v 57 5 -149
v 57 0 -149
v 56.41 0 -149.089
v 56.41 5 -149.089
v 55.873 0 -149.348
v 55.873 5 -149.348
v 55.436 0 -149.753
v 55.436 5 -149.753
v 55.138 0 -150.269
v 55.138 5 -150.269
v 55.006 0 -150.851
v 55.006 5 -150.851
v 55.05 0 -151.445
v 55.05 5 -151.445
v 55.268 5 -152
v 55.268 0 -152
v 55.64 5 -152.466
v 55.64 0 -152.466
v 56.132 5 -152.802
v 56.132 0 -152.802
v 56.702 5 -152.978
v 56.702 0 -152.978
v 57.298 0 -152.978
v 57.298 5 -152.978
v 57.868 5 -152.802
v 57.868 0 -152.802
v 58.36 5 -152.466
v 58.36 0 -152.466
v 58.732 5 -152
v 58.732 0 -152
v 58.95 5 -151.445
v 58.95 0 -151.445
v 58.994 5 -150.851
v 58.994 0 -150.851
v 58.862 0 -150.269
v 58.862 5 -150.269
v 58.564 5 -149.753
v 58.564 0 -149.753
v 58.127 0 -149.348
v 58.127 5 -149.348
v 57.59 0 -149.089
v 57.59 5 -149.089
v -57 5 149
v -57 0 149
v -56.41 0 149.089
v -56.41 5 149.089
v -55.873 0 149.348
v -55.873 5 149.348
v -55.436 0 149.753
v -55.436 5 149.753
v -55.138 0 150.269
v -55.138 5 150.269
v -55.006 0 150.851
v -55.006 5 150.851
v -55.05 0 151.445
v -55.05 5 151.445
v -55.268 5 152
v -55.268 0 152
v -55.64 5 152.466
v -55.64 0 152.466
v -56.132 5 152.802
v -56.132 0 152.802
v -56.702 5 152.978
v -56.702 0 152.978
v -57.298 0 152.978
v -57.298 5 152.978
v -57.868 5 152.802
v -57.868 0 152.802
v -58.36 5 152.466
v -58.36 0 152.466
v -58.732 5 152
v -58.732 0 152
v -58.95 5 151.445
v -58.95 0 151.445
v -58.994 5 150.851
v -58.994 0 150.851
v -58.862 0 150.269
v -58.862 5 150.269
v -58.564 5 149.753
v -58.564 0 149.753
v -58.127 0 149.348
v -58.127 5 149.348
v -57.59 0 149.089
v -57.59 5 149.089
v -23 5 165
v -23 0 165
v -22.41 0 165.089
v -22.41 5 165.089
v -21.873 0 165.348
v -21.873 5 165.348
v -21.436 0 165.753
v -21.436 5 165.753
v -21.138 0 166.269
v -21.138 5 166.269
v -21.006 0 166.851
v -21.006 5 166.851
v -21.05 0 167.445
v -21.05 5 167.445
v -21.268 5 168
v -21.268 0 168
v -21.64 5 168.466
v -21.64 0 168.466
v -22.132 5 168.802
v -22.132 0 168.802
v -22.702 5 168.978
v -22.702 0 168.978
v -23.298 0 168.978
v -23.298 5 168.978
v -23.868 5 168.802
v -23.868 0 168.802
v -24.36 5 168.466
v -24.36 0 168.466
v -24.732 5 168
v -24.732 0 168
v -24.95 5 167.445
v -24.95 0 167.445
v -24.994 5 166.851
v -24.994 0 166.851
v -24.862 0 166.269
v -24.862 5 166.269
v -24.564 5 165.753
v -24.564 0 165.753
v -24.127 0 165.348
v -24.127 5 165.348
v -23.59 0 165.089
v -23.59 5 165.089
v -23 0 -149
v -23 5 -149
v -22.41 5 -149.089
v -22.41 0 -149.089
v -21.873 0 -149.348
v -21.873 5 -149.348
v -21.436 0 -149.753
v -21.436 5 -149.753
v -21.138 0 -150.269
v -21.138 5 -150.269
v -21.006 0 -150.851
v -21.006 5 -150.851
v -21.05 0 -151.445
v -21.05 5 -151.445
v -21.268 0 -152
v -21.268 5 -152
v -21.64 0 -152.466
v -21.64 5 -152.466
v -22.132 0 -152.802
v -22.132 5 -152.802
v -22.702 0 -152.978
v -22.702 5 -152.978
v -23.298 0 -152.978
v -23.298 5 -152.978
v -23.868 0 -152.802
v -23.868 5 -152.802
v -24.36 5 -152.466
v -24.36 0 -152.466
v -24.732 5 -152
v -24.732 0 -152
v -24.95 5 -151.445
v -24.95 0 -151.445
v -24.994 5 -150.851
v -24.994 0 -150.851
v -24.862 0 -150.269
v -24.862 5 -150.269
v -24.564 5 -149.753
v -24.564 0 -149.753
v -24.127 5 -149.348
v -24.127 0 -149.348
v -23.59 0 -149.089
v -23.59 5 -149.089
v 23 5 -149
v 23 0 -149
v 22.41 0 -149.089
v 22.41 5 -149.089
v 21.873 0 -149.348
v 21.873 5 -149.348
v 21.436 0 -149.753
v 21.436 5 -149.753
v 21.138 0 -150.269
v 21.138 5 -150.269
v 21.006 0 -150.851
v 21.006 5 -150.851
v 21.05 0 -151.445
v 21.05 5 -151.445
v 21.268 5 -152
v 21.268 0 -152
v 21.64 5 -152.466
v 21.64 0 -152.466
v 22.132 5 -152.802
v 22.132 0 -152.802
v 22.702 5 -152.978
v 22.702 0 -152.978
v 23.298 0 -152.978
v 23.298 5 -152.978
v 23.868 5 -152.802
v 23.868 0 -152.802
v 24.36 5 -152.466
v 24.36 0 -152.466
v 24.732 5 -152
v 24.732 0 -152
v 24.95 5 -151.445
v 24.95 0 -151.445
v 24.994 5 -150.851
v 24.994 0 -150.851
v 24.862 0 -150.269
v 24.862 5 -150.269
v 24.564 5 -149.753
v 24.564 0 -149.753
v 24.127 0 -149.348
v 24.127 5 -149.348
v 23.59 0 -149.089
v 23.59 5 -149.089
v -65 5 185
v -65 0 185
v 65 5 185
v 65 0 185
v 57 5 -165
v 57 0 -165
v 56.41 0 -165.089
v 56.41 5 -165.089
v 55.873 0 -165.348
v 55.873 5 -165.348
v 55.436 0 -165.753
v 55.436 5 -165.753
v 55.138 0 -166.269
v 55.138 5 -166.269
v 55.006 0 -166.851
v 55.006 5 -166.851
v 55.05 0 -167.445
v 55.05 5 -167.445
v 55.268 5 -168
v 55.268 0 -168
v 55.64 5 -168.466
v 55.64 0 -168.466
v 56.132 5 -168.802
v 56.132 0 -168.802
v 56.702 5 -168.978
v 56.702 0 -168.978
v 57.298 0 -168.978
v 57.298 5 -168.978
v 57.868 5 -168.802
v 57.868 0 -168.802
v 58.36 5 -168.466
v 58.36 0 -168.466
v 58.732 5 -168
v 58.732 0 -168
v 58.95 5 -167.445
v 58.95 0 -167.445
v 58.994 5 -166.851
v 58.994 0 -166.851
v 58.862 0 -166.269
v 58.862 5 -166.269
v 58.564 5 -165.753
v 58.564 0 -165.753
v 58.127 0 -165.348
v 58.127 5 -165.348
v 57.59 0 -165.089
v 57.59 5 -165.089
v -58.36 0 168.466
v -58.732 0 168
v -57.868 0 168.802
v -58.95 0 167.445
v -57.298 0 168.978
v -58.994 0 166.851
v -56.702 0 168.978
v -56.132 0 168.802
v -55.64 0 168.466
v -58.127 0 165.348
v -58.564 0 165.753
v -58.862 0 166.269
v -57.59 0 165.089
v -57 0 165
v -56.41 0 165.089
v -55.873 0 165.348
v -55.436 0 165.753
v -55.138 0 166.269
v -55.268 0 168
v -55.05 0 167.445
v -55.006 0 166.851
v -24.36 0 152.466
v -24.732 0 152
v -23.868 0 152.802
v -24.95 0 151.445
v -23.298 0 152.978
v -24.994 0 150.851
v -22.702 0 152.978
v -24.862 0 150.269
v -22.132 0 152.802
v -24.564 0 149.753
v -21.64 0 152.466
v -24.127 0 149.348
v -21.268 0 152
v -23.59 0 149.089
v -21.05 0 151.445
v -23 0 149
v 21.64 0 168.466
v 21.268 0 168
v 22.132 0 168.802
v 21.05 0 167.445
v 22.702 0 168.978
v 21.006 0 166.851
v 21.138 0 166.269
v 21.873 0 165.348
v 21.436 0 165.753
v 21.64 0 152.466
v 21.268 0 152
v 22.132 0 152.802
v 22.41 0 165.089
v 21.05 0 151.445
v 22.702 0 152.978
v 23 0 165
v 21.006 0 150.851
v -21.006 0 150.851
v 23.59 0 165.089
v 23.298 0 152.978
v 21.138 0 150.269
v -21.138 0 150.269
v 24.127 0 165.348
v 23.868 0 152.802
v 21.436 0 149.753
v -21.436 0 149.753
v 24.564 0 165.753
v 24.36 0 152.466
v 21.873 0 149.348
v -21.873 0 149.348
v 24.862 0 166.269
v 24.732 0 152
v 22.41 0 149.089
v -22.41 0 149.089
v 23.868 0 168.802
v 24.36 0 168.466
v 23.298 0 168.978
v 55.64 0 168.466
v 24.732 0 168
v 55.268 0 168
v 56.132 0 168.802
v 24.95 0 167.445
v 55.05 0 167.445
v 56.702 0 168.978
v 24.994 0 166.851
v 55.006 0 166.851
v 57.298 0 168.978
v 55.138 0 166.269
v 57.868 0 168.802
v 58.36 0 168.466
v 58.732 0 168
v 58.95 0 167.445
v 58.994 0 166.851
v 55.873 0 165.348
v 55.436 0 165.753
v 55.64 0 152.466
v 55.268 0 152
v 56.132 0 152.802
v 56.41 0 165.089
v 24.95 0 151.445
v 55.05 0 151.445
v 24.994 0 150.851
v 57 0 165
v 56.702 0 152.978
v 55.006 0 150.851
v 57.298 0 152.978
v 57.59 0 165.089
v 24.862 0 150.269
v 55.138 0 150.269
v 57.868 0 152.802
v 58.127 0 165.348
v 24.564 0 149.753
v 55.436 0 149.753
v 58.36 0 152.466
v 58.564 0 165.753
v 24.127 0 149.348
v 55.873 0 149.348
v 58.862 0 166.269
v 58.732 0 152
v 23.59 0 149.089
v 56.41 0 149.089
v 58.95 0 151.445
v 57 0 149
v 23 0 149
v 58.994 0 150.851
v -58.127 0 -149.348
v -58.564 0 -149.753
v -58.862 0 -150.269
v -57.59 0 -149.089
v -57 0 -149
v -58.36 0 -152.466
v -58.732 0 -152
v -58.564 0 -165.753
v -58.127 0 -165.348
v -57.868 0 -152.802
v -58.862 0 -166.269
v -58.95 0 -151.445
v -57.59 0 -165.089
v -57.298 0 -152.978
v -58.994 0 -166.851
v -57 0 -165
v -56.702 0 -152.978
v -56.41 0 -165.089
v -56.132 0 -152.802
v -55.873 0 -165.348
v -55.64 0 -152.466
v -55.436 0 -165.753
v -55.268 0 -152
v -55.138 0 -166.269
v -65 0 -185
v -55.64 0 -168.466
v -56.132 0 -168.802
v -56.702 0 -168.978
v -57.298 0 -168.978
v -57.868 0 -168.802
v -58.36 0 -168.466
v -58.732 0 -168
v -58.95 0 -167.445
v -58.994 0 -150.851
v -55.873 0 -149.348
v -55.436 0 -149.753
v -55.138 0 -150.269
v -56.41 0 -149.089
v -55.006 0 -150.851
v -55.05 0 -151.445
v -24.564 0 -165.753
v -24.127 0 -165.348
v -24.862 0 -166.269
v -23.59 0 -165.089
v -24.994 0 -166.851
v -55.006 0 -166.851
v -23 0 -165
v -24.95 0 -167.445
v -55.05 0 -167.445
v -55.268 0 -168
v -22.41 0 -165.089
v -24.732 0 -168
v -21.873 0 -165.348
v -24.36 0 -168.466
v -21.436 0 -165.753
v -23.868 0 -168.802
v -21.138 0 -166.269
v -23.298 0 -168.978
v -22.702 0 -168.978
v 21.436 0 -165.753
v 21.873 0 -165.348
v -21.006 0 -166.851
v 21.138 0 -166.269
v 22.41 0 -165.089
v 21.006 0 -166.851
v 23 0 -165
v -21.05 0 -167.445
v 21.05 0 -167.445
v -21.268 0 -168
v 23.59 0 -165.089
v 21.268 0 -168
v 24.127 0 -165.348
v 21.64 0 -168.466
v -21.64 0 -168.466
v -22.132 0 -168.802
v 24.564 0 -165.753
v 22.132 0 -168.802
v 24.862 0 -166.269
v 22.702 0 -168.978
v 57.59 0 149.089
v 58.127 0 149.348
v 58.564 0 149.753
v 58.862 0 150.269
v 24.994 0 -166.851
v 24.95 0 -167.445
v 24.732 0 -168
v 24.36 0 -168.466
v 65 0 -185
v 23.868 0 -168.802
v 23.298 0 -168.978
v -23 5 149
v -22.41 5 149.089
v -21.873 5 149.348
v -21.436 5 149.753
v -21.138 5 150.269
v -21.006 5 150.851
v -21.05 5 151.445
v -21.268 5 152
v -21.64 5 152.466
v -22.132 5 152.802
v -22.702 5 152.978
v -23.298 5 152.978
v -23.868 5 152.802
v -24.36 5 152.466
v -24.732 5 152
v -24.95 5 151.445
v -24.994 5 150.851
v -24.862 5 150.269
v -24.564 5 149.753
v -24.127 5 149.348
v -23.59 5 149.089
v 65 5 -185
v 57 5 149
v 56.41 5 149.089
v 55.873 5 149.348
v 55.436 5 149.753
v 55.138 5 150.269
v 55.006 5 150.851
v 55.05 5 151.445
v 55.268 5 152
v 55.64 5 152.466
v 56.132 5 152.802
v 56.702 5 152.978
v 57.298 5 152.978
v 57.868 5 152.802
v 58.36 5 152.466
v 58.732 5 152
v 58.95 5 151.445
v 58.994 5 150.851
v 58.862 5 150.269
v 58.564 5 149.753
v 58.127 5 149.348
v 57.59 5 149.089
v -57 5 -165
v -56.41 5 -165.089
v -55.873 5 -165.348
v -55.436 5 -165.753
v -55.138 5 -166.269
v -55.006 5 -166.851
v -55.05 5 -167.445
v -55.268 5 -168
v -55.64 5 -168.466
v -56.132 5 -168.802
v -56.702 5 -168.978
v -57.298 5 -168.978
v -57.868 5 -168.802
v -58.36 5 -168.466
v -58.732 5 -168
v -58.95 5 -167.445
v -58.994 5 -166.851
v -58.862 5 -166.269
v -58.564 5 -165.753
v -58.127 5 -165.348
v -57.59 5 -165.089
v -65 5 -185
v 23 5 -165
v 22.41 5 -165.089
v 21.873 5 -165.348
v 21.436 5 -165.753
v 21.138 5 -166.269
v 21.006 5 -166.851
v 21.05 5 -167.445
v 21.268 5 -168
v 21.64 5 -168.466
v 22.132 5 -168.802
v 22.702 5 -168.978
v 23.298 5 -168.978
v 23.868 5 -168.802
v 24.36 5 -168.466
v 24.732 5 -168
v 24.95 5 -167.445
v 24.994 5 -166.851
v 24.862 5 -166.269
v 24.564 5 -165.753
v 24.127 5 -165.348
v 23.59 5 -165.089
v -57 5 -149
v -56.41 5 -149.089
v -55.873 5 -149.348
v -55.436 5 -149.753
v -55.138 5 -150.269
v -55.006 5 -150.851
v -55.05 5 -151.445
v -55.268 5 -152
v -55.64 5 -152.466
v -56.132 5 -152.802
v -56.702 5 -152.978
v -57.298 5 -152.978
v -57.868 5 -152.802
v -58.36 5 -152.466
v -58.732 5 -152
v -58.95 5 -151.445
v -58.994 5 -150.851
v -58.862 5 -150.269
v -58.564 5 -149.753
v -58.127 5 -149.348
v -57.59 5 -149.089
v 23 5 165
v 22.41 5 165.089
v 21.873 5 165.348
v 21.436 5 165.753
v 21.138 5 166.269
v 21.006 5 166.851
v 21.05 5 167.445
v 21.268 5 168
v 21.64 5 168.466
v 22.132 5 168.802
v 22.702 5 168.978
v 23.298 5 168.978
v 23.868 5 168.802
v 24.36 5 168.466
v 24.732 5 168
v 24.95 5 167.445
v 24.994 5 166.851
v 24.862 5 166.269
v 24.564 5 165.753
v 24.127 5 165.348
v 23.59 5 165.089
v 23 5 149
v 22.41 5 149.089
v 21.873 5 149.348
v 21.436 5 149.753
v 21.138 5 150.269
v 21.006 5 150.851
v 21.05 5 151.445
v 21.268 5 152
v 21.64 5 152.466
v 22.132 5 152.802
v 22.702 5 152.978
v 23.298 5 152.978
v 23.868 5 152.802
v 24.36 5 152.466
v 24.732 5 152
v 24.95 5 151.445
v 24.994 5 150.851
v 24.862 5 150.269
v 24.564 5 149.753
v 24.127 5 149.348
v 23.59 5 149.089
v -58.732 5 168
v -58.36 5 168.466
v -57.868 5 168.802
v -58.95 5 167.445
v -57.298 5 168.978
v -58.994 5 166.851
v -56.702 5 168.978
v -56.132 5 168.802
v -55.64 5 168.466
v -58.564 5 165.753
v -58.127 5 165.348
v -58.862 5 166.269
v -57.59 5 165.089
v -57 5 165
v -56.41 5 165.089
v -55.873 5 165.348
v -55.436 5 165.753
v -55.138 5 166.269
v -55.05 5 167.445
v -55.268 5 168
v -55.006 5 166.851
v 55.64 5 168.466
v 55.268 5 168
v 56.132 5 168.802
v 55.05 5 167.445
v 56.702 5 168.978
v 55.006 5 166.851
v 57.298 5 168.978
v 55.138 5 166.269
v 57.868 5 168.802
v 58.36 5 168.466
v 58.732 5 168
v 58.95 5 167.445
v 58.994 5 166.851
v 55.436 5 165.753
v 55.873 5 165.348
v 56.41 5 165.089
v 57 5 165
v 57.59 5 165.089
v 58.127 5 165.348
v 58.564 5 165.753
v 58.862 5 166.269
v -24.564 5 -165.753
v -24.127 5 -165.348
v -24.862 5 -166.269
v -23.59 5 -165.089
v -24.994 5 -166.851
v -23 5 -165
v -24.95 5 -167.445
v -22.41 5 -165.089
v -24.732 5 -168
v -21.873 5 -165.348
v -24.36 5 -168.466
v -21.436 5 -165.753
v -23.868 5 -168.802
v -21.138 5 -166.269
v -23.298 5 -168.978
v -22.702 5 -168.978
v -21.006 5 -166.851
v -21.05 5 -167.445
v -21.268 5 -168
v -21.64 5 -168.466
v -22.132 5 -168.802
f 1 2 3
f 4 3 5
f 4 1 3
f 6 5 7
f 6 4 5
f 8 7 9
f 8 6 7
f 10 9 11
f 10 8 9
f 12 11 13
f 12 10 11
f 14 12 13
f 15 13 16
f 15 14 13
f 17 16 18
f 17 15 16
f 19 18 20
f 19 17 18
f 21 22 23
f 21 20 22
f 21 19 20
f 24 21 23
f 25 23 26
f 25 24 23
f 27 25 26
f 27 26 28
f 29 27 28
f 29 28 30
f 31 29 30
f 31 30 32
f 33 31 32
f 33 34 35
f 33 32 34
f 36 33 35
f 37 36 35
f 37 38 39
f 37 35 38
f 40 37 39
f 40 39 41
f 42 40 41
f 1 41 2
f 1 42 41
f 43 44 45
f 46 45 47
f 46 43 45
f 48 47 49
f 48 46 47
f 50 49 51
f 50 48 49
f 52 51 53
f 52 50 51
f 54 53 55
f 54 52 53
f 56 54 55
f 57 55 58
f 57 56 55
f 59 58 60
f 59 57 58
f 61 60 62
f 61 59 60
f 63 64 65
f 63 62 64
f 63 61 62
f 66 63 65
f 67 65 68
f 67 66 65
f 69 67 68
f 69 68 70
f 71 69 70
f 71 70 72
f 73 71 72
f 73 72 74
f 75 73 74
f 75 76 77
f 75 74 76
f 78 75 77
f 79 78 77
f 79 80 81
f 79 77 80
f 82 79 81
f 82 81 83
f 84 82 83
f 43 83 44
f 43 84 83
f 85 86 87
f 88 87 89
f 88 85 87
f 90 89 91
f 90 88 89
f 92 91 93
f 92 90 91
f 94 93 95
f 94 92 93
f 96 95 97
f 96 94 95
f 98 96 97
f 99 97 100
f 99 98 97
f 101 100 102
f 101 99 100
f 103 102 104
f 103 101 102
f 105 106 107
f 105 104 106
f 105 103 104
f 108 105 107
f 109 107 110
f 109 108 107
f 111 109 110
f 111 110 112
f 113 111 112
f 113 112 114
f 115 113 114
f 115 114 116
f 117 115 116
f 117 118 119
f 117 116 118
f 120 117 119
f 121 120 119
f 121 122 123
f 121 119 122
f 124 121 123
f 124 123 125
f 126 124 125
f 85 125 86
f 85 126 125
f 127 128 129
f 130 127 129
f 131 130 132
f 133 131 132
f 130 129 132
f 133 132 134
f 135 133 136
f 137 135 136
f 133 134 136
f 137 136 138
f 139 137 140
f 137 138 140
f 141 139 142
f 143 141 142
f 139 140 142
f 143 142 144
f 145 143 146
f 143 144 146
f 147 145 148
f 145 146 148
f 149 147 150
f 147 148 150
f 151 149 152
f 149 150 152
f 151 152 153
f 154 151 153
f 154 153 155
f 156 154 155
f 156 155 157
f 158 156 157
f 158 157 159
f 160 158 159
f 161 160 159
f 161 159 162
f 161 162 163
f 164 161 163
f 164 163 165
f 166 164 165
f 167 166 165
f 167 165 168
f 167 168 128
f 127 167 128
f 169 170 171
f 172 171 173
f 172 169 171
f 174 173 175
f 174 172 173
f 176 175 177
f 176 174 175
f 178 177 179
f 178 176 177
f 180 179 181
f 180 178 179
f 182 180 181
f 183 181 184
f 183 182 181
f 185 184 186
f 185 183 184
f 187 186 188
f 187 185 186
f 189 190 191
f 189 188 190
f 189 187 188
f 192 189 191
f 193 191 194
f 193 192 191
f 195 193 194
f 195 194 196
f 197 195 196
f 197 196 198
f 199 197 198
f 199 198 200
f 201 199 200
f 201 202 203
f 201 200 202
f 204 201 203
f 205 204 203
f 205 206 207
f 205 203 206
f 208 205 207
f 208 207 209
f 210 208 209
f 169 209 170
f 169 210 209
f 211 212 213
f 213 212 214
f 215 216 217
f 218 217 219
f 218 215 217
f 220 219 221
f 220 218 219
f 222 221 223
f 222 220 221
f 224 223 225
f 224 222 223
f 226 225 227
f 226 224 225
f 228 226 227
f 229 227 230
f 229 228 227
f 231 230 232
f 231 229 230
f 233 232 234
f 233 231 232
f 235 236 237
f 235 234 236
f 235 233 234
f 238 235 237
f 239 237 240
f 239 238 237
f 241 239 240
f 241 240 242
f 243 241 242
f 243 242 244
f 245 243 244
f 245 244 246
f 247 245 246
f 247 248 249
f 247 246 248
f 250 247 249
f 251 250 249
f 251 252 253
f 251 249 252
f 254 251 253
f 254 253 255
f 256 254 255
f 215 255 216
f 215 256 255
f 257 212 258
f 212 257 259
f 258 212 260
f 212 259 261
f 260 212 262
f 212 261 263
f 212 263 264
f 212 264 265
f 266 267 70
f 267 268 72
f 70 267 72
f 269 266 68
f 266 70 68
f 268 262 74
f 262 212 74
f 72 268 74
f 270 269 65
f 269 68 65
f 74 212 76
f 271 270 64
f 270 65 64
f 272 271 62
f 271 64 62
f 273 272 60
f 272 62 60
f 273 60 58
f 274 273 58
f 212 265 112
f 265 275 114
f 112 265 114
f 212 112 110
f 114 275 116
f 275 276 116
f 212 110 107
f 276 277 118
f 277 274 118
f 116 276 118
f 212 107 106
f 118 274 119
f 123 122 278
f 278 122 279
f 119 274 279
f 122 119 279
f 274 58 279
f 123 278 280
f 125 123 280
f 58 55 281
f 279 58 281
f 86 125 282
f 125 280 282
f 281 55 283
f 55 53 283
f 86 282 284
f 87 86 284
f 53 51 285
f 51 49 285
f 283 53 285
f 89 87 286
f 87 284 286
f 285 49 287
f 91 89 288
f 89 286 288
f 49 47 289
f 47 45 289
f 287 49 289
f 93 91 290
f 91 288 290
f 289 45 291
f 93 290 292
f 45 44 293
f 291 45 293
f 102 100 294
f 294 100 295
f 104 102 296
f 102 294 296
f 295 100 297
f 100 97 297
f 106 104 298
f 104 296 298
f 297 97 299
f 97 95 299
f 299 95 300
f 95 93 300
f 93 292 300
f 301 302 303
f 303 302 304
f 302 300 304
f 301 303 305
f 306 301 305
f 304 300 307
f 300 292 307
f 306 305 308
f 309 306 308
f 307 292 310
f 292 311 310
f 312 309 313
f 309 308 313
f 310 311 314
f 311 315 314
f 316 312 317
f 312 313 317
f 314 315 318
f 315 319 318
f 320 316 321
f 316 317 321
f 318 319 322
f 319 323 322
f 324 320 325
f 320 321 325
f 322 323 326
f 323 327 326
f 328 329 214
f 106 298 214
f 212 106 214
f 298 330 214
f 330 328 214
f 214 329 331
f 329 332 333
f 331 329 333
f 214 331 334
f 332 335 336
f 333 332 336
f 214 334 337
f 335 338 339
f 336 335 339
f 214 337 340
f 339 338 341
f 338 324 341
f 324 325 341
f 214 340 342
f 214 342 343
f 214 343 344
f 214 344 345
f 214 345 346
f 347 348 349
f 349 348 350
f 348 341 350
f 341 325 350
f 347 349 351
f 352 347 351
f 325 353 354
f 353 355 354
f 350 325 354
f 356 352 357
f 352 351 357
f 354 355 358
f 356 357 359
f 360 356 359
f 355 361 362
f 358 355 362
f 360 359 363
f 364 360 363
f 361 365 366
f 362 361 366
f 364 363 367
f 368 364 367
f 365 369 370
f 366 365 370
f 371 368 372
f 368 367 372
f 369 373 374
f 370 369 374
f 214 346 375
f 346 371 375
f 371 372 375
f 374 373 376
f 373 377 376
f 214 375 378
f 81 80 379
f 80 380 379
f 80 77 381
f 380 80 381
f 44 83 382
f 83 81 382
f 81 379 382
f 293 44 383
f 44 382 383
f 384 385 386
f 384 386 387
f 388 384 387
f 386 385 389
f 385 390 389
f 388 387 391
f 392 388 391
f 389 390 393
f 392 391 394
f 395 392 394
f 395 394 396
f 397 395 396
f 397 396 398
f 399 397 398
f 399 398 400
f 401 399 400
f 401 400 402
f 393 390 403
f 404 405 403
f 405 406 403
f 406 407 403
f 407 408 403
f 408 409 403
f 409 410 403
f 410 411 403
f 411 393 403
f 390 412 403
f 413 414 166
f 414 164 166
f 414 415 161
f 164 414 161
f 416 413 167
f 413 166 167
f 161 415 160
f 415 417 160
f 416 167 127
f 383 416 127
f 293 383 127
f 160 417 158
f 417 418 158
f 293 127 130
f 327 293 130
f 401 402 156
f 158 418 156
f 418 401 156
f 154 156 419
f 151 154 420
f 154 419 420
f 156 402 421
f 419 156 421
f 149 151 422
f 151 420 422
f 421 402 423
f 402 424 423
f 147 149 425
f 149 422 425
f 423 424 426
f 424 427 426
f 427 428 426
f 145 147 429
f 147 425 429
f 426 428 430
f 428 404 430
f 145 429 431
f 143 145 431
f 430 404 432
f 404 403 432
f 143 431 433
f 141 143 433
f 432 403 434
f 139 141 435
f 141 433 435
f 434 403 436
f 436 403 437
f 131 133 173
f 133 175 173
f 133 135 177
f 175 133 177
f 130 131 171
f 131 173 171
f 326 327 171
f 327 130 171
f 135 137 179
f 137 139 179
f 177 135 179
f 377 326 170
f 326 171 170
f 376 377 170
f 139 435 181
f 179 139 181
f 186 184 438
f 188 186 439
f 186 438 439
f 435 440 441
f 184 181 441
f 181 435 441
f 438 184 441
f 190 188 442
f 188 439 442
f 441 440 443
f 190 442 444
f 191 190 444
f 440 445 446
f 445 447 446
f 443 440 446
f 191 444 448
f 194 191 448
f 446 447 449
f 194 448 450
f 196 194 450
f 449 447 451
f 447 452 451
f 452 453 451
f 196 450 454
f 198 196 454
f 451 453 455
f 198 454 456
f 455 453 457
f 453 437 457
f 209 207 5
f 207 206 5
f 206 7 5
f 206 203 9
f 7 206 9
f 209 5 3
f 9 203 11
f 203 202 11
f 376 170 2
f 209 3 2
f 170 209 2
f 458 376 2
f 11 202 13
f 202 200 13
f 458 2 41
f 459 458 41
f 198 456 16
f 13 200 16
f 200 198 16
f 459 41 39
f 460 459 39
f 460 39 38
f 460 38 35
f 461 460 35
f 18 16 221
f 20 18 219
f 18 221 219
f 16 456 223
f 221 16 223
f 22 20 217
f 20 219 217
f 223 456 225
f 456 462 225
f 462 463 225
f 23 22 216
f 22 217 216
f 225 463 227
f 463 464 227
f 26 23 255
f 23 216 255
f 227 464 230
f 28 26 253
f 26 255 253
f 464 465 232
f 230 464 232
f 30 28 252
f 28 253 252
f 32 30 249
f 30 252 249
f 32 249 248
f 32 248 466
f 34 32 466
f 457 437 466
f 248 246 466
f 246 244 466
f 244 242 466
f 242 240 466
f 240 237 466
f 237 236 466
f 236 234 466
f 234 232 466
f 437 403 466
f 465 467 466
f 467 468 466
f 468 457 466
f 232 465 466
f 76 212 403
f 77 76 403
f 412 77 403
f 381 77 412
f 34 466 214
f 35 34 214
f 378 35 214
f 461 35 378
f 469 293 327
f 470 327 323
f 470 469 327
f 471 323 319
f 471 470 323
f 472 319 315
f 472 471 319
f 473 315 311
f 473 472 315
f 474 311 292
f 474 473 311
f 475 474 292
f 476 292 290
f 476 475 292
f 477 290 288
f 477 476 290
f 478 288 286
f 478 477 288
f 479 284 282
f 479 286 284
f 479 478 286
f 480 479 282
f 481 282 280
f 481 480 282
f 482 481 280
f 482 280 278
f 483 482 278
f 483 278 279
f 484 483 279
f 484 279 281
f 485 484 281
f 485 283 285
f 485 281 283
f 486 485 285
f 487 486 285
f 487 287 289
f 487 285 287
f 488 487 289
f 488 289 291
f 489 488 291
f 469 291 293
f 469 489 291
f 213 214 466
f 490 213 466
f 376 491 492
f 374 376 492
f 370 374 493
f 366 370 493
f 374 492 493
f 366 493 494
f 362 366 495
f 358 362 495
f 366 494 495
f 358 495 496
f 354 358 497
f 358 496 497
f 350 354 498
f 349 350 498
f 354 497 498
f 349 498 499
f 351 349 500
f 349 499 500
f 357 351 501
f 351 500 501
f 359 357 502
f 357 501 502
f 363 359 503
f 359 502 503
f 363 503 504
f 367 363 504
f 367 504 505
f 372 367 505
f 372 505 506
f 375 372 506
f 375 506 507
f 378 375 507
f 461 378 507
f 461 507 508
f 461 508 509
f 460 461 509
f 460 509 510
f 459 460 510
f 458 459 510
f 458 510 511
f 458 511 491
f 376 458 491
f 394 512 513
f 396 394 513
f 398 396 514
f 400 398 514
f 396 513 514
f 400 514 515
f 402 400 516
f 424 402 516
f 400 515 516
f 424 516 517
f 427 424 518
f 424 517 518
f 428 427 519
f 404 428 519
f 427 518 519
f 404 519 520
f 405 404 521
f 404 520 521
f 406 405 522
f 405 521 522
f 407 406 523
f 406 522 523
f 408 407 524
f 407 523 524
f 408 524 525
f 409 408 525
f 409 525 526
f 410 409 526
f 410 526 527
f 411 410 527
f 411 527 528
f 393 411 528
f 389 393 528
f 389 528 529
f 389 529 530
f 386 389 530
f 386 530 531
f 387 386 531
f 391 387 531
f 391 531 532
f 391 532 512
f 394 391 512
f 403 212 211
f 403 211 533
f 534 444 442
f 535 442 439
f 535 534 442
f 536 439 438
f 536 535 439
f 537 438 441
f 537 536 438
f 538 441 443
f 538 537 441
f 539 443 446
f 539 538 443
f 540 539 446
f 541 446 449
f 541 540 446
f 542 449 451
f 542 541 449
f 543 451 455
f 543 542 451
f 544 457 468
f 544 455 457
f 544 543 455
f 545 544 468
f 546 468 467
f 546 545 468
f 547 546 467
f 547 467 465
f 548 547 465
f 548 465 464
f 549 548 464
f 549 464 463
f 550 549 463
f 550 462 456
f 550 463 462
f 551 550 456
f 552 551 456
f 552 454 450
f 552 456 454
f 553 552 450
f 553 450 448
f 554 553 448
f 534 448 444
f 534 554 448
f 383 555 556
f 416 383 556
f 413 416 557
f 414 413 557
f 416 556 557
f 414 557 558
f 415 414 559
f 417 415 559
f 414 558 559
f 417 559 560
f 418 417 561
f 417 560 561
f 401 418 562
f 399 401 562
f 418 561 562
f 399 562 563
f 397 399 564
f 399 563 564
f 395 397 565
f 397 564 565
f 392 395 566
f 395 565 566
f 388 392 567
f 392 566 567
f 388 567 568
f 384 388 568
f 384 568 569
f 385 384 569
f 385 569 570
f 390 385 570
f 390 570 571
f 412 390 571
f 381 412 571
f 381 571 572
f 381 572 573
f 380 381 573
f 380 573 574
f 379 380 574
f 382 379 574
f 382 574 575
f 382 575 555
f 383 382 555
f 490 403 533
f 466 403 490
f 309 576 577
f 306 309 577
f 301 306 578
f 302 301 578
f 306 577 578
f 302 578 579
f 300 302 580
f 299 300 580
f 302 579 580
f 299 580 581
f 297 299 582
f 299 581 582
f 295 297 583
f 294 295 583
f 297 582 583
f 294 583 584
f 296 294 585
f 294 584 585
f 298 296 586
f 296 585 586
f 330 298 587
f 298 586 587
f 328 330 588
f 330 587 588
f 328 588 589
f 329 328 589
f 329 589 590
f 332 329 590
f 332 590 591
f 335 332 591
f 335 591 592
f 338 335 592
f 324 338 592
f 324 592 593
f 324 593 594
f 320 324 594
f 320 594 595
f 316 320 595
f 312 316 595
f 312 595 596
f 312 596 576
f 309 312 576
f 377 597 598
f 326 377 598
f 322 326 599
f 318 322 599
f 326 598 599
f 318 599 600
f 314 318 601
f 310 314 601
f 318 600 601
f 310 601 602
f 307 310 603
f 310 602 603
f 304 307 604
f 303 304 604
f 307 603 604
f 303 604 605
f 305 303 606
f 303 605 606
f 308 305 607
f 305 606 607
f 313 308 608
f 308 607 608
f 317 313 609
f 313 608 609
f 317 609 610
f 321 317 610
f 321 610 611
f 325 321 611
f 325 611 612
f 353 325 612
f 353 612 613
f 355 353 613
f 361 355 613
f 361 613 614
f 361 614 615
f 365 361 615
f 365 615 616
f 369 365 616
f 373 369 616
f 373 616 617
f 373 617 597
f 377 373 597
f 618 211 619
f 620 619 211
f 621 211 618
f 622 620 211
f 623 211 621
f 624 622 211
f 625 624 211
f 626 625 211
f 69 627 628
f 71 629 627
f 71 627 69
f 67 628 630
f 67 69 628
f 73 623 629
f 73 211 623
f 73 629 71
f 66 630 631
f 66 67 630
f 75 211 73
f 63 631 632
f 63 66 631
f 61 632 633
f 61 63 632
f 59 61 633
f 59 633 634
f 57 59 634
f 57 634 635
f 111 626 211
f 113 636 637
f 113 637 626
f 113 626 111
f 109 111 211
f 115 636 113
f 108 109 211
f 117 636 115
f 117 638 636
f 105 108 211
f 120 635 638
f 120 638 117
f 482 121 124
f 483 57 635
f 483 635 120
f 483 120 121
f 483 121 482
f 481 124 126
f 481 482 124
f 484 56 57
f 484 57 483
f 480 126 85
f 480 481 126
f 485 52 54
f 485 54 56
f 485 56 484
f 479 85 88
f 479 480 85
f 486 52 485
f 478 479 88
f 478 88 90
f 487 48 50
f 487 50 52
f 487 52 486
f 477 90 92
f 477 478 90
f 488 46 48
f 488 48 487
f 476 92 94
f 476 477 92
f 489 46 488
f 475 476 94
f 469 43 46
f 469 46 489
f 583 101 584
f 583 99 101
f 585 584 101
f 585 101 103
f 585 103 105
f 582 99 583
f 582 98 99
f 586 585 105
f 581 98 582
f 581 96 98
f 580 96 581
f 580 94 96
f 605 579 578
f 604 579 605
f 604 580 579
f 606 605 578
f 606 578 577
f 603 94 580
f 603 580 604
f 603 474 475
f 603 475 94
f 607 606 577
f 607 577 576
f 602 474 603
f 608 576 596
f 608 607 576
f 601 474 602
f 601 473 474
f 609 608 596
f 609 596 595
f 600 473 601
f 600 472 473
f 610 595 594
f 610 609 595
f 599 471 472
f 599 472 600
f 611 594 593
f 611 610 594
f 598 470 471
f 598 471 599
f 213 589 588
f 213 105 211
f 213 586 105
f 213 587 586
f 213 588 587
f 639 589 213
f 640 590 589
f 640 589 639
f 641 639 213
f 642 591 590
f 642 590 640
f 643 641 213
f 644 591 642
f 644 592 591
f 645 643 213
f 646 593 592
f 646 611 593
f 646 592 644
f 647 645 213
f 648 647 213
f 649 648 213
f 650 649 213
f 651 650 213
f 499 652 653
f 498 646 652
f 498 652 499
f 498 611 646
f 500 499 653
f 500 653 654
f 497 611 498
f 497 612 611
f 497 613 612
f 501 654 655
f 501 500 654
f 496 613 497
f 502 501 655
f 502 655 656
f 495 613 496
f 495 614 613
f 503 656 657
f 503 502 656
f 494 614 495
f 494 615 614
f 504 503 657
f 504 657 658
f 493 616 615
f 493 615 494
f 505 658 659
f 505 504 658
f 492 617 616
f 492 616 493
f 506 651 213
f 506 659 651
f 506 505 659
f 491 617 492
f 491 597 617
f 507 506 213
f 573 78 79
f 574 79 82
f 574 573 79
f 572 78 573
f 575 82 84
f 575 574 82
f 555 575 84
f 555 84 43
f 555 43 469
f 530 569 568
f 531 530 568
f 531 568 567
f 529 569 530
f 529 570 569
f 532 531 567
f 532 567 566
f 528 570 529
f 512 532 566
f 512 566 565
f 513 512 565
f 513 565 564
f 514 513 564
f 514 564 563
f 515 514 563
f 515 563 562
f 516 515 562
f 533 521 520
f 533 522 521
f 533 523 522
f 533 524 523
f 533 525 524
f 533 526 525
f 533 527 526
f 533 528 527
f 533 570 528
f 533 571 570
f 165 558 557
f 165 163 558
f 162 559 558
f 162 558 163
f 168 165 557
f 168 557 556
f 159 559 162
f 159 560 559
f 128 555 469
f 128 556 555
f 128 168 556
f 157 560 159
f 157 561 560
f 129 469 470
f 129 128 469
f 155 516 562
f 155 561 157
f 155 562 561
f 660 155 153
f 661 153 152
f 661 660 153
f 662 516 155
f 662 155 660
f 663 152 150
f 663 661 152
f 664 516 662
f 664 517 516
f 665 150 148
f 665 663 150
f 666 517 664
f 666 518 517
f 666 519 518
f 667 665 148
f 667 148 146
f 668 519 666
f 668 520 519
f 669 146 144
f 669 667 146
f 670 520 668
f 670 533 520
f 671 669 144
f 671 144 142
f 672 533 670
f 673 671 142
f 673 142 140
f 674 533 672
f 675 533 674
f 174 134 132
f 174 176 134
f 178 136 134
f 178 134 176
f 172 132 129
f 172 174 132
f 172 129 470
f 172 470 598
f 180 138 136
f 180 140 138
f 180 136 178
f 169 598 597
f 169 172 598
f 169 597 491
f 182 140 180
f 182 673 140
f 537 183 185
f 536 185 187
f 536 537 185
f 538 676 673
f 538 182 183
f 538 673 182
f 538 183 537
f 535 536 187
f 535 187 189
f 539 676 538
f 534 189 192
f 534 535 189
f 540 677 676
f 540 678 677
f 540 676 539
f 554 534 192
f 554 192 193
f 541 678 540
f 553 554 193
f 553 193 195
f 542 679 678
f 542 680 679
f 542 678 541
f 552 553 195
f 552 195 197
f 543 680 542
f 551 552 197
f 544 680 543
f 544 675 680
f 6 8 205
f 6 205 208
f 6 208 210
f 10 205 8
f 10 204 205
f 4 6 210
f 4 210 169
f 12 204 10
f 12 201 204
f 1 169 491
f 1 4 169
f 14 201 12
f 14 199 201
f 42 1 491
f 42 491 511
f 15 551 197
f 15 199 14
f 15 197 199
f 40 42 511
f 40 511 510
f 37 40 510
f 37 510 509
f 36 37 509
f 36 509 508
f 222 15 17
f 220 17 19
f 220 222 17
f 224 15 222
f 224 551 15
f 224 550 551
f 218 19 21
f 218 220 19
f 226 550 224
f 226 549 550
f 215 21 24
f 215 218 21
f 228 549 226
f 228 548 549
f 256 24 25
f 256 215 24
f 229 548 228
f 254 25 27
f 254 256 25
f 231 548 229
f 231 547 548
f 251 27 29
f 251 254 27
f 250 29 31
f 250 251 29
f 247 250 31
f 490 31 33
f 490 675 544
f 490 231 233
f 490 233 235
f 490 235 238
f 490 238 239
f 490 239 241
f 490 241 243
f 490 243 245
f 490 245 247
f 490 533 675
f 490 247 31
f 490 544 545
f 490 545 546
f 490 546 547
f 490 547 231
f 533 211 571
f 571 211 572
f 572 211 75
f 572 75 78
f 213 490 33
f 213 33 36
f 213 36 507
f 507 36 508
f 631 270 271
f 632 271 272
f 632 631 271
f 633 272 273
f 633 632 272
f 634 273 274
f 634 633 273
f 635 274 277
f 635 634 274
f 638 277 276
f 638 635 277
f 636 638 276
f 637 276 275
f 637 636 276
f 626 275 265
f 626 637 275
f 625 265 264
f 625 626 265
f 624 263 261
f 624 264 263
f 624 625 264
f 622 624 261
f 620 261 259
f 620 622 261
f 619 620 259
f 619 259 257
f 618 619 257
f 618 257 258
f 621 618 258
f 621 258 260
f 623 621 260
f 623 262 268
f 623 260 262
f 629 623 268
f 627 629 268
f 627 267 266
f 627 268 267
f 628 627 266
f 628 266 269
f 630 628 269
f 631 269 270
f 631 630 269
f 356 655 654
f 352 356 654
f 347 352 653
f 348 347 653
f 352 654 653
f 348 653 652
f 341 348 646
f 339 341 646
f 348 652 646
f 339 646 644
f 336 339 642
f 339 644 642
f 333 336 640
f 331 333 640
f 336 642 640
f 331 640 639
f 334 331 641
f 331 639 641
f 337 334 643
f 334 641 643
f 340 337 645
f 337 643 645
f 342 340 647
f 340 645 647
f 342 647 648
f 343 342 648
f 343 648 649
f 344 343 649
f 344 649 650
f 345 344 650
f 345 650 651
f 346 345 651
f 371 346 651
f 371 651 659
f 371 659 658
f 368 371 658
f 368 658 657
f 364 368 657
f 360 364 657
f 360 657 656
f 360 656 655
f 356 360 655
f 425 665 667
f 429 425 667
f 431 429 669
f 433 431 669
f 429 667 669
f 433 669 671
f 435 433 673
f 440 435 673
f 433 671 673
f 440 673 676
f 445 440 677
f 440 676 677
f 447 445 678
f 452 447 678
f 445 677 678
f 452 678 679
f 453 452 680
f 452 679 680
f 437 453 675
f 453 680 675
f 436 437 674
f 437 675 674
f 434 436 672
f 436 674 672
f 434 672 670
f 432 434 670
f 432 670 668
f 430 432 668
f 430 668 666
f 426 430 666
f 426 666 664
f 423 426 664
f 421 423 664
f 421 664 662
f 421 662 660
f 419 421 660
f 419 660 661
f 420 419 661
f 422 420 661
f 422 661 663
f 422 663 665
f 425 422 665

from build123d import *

# Parameters (mm, degrees)
SKETCH2_W                                  = 130
SKETCH2_H                                  = 370
BOSS_EXTRUDE1_DEPTH                        = 5
SKETCH3_R                                  = 2
CUT_EXTRUDE1_DEPTH                         = 10
MIRROR1_AT_THE_SECOND_PLANE_COPY_1_SKETC_R = 2
MIRROR1_AT_THE_SECOND_PLANE_COPY_1_DEPTH   = 10


with BuildPart() as part:
    # Sketch2 → Boss-Extrude1 (new body)
    with BuildSketch(Plane(origin=(0, 0, 0), x_dir=(1, 0, 0), z_dir=(0, 1, 0))):
        Rectangle(SKETCH2_W, SKETCH2_H)
    extrude(amount=BOSS_EXTRUDE1_DEPTH)

    # Sketch3 → Cut-Extrude1 (cut)
    with BuildSketch(Plane(origin=(0, 5, 0), x_dir=(1, 0, 0), z_dir=(0, 1, 0))):
        with Locations(Location((-57, 167, 0), (0, 0, 270))):
            Circle(SKETCH3_R)
        with Locations(Location((-57, 151, 0), (0, 0, 270))):
            Circle(SKETCH3_R)
        with Locations(Location((-23, 167, 0), (0, 0, 270))):
            Circle(SKETCH3_R)
        with Locations(Location((-23, 151, 0), (0, 0, 270))):
            Circle(SKETCH3_R)
    cut_extrude1 = extrude(amount=-CUT_EXTRUDE1_DEPTH, mode=Mode.SUBTRACT)

    # Mirror1: Cut-Extrude1 across plane
    add(cut_extrude1.mirror(Plane.XY), mode=Mode.SUBTRACT)

    # Mirror1 at the second plane: Cut-Extrude1 across plane
    add(cut_extrude1.mirror(Plane(origin=(0, 0, 0), x_dir=(0, 0, 1), z_dir=(1, 0, 0))), mode=Mode.SUBTRACT)

    # Mirror1 at the second plane copy 1 sketc → Mirror1 at the second plane copy 1 (cut)
    with BuildSketch(Plane(origin=(0, 5, 0), x_dir=(-1, 0, 0), z_dir=(0, 1, 0))):
        with Locations(Location((-57, 167, 0), (0, 0, 270))):
            Circle(MIRROR1_AT_THE_SECOND_PLANE_COPY_1_SKETC_R)
        with Locations(Location((-57, 151, 0), (0, 0, 270))):
            Circle(MIRROR1_AT_THE_SECOND_PLANE_COPY_1_SKETC_R)
        with Locations(Location((-23, 167, 0), (0, 0, 270))):
            Circle(MIRROR1_AT_THE_SECOND_PLANE_COPY_1_SKETC_R)
        with Locations(Location((-23, 151, 0), (0, 0, 270))):
            Circle(MIRROR1_AT_THE_SECOND_PLANE_COPY_1_SKETC_R)
    extrude(amount=-MIRROR1_AT_THE_SECOND_PLANE_COPY_1_DEPTH, mode=Mode.SUBTRACT)


solid = part.part
